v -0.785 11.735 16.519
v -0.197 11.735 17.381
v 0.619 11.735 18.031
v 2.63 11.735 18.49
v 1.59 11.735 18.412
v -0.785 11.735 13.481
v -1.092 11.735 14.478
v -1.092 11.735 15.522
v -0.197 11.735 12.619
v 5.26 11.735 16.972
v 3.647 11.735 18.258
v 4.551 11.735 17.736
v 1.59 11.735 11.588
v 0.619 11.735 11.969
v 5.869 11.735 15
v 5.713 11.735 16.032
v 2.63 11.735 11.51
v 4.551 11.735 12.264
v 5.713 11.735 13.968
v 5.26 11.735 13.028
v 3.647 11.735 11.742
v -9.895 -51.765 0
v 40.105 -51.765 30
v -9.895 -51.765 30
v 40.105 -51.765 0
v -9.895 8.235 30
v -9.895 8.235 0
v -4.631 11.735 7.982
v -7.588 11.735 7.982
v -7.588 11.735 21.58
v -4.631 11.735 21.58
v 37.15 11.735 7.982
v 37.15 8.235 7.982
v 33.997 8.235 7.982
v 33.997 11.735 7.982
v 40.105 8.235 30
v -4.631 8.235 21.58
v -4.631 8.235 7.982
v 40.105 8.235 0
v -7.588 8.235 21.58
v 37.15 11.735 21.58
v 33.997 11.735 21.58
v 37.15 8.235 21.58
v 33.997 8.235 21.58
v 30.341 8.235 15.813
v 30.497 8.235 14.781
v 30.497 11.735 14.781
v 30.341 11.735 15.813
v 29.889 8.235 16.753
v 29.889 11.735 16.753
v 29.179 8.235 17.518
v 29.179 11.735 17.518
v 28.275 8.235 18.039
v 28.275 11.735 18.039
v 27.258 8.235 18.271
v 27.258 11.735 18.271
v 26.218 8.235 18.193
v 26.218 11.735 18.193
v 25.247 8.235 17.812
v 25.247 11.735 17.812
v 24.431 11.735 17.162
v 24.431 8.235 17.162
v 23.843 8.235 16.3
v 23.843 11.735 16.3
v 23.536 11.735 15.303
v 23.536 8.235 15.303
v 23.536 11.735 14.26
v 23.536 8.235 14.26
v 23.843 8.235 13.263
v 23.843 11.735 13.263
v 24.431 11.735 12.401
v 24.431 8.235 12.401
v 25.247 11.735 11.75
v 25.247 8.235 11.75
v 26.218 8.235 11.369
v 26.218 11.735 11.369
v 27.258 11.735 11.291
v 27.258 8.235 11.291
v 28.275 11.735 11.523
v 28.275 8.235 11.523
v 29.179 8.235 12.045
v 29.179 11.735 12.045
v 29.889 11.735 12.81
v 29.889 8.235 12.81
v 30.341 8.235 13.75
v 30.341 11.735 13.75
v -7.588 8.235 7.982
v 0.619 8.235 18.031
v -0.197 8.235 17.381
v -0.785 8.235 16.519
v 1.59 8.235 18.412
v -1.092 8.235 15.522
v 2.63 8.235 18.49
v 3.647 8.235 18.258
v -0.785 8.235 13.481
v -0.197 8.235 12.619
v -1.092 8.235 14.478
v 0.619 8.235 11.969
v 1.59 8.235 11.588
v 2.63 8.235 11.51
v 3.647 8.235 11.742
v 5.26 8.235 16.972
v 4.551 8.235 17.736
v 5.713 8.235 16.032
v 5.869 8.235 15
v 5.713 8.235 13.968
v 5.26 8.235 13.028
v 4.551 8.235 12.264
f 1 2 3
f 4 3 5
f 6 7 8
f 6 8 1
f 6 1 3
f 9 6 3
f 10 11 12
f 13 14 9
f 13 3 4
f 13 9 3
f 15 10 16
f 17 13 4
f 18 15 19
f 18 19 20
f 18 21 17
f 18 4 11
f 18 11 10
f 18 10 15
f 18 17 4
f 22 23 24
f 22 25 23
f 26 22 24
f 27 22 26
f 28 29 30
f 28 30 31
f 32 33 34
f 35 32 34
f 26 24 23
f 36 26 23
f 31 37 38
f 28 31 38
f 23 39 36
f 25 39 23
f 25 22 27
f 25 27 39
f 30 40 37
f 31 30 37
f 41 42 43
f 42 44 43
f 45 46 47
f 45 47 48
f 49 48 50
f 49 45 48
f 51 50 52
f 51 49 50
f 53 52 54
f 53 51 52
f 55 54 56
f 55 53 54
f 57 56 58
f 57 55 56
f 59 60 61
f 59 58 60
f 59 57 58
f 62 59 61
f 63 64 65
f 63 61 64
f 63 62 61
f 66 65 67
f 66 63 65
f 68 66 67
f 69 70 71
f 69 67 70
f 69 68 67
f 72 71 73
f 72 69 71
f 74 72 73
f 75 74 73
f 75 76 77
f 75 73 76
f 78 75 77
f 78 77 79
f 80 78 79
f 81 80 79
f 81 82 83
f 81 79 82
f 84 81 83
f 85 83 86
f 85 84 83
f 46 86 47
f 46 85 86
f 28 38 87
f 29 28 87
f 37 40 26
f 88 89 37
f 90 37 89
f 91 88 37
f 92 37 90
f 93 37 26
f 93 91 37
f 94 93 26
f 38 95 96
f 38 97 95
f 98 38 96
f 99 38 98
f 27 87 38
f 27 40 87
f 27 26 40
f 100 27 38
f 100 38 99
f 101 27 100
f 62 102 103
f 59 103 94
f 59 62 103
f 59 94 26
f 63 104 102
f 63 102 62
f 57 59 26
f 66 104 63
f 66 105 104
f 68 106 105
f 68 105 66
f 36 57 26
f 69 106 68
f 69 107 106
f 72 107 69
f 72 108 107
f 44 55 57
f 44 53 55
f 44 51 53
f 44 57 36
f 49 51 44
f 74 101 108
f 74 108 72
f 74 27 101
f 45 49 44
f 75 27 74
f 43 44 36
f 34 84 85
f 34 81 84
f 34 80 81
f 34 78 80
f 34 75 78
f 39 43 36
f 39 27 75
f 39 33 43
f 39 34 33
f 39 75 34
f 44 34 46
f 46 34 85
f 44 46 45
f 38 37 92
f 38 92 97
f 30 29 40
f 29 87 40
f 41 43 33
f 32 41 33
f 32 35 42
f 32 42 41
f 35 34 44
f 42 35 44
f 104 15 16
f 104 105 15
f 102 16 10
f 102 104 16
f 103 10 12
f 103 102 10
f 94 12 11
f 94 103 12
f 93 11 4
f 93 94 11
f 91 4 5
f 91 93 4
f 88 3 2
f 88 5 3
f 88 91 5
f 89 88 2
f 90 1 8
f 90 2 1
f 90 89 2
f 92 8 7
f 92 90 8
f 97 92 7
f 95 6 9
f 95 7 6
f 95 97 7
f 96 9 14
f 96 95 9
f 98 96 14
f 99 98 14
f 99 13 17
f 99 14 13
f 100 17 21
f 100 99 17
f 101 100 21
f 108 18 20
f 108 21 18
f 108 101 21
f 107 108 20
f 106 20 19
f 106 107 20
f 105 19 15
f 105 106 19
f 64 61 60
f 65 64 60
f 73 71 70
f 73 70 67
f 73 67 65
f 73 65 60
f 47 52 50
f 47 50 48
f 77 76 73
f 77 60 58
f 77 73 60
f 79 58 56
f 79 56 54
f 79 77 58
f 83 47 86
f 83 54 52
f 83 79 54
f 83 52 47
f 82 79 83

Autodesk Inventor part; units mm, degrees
ref_plane "YZ Plane" through (0, 0, 0) normal (1, 0, 0) x (0, 1, 0)
ref_plane "XZ Plane" through (0, 0, 0) normal (0, 1, 0) x (-1, 0, 0)
ref_plane "XY Plane" through (0, 0, 0) normal (0, 0, 1) x (1, 0, 0)
sketch "Sketch1" plane through (0, 0, 0) normal (0, 0, 1) x (1, 0, 0)
  point P0 (0, 0)
sketch "Sketch2" plane through (0, 0, 0) normal (0, 0, 1) x (1, 0, 0)
  line L0 (-9.8946, 8.2346) -> (40.1054, 8.2346)
  line L1 (40.1054, 8.2346) -> (40.1054, -51.7654)
  line L2 (40.1054, -51.7654) -> (-9.8946, -51.7654)
  line L3 (-9.8946, -51.7654) -> (-9.8946, 8.2346)
  point P0 (0, 0)
  dimension "d0" = 50
  dimension "d1" = 60
extrude "Extrusion1" add sketch "Sketch2" along normal blind 30
sketch "Sketch3" plane through (-9.8946, 8.2346, 0) normal (0, 1, 0) x (1, 0, 0)
  line L0 (2.3069, -21.5805) -> (5.2632, -21.5805)
  line L1 (5.2632, -21.5805) -> (5.2632, -7.9818)
  line L2 (5.2632, -7.9818) -> (2.3069, -7.9818)
  line L3 (2.3069, -7.9818) -> (2.3069, -21.5805)
  line L4 (43.8913, -21.5805) -> (47.0446, -21.5805)
  line L5 (47.0446, -21.5805) -> (47.0446, -7.9818)
  line L6 (47.0446, -7.9818) -> (43.8913, -7.9818)
  line L7 (43.8913, -7.9818) -> (43.8913, -21.5805)
  point P0 (9.8946, 0)
extrude "Extrusion2" add sketch "Sketch3" along normal blind 3.5
sketch "Sketch4" plane through (-9.8946, 8.2346, 0) normal (0, 1, 0) x (1, 0, 0)
  circle A0 centre (12.2632, -15) radius 3.5
  line L0 (50, -30) -> (0, -30) projected
  circle A1 centre (36.8913, -14.7812) radius 3.5
  line L1 (5.2632, -21.5805) -> (5.2632, -7.9818) projected
  line L2 (43.8913, -7.9818) -> (43.8913, -21.5805) projected
  point P0 (9.8946, 0)
  point P1 (5.2632, -14.7812)
  point P2 (43.8913, -14.7812)
  dimension "d6" = 15
  dimension "d7" = 7
  dimension "d8" = 7
  dimension "d9" = 7
  dimension "d10" = 24.6281
  dimension "d11" = 7
extrude "Extrusion3" add sketch "Sketch4" along normal blind 3.5
properties part number "battery"
